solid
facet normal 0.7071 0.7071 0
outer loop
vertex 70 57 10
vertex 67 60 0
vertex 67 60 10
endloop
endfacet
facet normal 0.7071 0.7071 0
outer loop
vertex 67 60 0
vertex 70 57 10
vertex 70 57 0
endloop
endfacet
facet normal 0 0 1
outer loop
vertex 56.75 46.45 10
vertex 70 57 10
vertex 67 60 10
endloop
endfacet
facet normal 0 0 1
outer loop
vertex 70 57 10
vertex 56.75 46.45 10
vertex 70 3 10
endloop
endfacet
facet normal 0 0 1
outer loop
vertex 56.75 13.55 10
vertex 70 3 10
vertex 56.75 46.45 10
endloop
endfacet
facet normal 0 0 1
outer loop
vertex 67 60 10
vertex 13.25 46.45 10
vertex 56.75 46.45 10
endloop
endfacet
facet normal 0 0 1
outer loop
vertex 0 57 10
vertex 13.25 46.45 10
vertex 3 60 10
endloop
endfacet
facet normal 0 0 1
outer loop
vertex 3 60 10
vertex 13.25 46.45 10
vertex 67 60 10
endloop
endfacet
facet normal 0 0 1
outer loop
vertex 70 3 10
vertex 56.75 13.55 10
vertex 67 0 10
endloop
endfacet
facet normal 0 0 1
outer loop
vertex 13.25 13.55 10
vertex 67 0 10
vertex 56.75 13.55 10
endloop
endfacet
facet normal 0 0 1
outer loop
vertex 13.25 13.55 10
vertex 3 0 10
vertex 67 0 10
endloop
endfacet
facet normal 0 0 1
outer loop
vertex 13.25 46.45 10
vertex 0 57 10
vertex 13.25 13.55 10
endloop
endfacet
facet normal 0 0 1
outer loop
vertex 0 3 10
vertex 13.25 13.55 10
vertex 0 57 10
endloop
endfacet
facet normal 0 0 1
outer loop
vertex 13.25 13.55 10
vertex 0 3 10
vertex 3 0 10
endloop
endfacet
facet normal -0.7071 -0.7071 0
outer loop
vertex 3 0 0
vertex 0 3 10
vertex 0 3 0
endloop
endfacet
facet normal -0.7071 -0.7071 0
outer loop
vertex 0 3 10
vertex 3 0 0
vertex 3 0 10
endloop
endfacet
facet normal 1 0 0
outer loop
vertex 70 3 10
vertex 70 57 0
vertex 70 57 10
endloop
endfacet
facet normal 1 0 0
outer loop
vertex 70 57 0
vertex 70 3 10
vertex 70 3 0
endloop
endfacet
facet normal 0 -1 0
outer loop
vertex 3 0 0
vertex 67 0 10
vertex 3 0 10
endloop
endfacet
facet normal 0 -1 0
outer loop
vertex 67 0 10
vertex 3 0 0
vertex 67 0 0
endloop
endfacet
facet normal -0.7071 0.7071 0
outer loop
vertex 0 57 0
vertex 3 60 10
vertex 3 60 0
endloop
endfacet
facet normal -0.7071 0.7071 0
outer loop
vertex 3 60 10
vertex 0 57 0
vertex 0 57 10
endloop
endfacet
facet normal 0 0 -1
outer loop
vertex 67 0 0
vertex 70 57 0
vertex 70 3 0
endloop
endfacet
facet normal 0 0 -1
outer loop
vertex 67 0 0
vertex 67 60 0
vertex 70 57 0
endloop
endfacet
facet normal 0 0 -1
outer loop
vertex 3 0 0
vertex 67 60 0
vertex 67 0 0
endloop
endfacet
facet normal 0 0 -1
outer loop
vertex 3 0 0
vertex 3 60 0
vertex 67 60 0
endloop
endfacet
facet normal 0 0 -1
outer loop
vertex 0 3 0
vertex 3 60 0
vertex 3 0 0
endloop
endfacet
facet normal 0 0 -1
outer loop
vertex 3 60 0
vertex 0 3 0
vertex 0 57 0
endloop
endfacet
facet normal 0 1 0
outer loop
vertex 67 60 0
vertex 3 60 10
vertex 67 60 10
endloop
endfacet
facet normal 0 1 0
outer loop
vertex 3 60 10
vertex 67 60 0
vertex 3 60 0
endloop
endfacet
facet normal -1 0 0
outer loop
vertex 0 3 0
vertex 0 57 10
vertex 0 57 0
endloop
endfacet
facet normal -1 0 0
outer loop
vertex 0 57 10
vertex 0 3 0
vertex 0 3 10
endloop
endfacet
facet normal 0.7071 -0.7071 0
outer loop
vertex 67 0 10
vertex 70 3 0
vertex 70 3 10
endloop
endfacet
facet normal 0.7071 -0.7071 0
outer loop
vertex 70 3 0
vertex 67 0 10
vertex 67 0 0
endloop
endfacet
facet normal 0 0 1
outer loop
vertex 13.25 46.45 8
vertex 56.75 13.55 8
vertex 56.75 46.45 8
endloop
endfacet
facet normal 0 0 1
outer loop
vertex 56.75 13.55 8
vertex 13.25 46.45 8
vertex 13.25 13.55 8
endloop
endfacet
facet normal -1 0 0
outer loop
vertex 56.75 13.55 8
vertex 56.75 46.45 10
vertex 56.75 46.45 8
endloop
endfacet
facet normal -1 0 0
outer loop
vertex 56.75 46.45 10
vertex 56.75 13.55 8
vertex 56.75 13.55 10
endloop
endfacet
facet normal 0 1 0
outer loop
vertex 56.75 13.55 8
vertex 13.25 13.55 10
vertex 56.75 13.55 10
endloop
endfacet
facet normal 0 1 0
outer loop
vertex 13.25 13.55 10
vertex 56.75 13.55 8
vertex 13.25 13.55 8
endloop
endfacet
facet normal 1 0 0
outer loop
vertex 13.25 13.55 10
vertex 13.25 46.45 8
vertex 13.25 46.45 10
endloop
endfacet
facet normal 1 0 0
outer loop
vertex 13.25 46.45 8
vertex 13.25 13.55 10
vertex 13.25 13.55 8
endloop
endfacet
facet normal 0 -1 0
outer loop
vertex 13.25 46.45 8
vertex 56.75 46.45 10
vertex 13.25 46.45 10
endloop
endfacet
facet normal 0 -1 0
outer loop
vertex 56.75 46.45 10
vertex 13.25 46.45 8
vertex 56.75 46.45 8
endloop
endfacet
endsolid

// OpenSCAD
$fn = 32;

// ----------------------------------------------------------------------
// Windowed plate: 1 voids, 70 x 60 x 10 mm
// ----------------------------------------------------------------------

// --- parameters (mm) ---
plate_l = 70;             // plate length, X
plate_w = 60;             // plate width, Y
plate_t = 10;             // plate thickness, Z
edge_margin = 8;          // wall from the plate edge to any window
win1_l = 43.5;            // window length
win1_w = 32.9;            // window width
depth_1 = 2;              // depth of void 1 (full thickness = through)
corner_c = 3;             // corner chamfer of the plate

profile = [[3, 0], [67, 0], [70, 3], [70, 57], [67, 60], [3, 60], [0, 57], [0, 3]];  // primary outline, 8 points, counter clockwise
void_1 = [[13.25, 13.55], [56.75, 13.55], [56.75, 46.45], [13.25, 46.45]];  // large central window, 4 points

// --- the one profile operation ---
difference() {
  linear_extrude(height = plate_t) polygon(points = profile);
  translate([0, 0, plate_t - depth_1])
    linear_extrude(height = depth_1 + 1) polygon(points = void_1);
}
